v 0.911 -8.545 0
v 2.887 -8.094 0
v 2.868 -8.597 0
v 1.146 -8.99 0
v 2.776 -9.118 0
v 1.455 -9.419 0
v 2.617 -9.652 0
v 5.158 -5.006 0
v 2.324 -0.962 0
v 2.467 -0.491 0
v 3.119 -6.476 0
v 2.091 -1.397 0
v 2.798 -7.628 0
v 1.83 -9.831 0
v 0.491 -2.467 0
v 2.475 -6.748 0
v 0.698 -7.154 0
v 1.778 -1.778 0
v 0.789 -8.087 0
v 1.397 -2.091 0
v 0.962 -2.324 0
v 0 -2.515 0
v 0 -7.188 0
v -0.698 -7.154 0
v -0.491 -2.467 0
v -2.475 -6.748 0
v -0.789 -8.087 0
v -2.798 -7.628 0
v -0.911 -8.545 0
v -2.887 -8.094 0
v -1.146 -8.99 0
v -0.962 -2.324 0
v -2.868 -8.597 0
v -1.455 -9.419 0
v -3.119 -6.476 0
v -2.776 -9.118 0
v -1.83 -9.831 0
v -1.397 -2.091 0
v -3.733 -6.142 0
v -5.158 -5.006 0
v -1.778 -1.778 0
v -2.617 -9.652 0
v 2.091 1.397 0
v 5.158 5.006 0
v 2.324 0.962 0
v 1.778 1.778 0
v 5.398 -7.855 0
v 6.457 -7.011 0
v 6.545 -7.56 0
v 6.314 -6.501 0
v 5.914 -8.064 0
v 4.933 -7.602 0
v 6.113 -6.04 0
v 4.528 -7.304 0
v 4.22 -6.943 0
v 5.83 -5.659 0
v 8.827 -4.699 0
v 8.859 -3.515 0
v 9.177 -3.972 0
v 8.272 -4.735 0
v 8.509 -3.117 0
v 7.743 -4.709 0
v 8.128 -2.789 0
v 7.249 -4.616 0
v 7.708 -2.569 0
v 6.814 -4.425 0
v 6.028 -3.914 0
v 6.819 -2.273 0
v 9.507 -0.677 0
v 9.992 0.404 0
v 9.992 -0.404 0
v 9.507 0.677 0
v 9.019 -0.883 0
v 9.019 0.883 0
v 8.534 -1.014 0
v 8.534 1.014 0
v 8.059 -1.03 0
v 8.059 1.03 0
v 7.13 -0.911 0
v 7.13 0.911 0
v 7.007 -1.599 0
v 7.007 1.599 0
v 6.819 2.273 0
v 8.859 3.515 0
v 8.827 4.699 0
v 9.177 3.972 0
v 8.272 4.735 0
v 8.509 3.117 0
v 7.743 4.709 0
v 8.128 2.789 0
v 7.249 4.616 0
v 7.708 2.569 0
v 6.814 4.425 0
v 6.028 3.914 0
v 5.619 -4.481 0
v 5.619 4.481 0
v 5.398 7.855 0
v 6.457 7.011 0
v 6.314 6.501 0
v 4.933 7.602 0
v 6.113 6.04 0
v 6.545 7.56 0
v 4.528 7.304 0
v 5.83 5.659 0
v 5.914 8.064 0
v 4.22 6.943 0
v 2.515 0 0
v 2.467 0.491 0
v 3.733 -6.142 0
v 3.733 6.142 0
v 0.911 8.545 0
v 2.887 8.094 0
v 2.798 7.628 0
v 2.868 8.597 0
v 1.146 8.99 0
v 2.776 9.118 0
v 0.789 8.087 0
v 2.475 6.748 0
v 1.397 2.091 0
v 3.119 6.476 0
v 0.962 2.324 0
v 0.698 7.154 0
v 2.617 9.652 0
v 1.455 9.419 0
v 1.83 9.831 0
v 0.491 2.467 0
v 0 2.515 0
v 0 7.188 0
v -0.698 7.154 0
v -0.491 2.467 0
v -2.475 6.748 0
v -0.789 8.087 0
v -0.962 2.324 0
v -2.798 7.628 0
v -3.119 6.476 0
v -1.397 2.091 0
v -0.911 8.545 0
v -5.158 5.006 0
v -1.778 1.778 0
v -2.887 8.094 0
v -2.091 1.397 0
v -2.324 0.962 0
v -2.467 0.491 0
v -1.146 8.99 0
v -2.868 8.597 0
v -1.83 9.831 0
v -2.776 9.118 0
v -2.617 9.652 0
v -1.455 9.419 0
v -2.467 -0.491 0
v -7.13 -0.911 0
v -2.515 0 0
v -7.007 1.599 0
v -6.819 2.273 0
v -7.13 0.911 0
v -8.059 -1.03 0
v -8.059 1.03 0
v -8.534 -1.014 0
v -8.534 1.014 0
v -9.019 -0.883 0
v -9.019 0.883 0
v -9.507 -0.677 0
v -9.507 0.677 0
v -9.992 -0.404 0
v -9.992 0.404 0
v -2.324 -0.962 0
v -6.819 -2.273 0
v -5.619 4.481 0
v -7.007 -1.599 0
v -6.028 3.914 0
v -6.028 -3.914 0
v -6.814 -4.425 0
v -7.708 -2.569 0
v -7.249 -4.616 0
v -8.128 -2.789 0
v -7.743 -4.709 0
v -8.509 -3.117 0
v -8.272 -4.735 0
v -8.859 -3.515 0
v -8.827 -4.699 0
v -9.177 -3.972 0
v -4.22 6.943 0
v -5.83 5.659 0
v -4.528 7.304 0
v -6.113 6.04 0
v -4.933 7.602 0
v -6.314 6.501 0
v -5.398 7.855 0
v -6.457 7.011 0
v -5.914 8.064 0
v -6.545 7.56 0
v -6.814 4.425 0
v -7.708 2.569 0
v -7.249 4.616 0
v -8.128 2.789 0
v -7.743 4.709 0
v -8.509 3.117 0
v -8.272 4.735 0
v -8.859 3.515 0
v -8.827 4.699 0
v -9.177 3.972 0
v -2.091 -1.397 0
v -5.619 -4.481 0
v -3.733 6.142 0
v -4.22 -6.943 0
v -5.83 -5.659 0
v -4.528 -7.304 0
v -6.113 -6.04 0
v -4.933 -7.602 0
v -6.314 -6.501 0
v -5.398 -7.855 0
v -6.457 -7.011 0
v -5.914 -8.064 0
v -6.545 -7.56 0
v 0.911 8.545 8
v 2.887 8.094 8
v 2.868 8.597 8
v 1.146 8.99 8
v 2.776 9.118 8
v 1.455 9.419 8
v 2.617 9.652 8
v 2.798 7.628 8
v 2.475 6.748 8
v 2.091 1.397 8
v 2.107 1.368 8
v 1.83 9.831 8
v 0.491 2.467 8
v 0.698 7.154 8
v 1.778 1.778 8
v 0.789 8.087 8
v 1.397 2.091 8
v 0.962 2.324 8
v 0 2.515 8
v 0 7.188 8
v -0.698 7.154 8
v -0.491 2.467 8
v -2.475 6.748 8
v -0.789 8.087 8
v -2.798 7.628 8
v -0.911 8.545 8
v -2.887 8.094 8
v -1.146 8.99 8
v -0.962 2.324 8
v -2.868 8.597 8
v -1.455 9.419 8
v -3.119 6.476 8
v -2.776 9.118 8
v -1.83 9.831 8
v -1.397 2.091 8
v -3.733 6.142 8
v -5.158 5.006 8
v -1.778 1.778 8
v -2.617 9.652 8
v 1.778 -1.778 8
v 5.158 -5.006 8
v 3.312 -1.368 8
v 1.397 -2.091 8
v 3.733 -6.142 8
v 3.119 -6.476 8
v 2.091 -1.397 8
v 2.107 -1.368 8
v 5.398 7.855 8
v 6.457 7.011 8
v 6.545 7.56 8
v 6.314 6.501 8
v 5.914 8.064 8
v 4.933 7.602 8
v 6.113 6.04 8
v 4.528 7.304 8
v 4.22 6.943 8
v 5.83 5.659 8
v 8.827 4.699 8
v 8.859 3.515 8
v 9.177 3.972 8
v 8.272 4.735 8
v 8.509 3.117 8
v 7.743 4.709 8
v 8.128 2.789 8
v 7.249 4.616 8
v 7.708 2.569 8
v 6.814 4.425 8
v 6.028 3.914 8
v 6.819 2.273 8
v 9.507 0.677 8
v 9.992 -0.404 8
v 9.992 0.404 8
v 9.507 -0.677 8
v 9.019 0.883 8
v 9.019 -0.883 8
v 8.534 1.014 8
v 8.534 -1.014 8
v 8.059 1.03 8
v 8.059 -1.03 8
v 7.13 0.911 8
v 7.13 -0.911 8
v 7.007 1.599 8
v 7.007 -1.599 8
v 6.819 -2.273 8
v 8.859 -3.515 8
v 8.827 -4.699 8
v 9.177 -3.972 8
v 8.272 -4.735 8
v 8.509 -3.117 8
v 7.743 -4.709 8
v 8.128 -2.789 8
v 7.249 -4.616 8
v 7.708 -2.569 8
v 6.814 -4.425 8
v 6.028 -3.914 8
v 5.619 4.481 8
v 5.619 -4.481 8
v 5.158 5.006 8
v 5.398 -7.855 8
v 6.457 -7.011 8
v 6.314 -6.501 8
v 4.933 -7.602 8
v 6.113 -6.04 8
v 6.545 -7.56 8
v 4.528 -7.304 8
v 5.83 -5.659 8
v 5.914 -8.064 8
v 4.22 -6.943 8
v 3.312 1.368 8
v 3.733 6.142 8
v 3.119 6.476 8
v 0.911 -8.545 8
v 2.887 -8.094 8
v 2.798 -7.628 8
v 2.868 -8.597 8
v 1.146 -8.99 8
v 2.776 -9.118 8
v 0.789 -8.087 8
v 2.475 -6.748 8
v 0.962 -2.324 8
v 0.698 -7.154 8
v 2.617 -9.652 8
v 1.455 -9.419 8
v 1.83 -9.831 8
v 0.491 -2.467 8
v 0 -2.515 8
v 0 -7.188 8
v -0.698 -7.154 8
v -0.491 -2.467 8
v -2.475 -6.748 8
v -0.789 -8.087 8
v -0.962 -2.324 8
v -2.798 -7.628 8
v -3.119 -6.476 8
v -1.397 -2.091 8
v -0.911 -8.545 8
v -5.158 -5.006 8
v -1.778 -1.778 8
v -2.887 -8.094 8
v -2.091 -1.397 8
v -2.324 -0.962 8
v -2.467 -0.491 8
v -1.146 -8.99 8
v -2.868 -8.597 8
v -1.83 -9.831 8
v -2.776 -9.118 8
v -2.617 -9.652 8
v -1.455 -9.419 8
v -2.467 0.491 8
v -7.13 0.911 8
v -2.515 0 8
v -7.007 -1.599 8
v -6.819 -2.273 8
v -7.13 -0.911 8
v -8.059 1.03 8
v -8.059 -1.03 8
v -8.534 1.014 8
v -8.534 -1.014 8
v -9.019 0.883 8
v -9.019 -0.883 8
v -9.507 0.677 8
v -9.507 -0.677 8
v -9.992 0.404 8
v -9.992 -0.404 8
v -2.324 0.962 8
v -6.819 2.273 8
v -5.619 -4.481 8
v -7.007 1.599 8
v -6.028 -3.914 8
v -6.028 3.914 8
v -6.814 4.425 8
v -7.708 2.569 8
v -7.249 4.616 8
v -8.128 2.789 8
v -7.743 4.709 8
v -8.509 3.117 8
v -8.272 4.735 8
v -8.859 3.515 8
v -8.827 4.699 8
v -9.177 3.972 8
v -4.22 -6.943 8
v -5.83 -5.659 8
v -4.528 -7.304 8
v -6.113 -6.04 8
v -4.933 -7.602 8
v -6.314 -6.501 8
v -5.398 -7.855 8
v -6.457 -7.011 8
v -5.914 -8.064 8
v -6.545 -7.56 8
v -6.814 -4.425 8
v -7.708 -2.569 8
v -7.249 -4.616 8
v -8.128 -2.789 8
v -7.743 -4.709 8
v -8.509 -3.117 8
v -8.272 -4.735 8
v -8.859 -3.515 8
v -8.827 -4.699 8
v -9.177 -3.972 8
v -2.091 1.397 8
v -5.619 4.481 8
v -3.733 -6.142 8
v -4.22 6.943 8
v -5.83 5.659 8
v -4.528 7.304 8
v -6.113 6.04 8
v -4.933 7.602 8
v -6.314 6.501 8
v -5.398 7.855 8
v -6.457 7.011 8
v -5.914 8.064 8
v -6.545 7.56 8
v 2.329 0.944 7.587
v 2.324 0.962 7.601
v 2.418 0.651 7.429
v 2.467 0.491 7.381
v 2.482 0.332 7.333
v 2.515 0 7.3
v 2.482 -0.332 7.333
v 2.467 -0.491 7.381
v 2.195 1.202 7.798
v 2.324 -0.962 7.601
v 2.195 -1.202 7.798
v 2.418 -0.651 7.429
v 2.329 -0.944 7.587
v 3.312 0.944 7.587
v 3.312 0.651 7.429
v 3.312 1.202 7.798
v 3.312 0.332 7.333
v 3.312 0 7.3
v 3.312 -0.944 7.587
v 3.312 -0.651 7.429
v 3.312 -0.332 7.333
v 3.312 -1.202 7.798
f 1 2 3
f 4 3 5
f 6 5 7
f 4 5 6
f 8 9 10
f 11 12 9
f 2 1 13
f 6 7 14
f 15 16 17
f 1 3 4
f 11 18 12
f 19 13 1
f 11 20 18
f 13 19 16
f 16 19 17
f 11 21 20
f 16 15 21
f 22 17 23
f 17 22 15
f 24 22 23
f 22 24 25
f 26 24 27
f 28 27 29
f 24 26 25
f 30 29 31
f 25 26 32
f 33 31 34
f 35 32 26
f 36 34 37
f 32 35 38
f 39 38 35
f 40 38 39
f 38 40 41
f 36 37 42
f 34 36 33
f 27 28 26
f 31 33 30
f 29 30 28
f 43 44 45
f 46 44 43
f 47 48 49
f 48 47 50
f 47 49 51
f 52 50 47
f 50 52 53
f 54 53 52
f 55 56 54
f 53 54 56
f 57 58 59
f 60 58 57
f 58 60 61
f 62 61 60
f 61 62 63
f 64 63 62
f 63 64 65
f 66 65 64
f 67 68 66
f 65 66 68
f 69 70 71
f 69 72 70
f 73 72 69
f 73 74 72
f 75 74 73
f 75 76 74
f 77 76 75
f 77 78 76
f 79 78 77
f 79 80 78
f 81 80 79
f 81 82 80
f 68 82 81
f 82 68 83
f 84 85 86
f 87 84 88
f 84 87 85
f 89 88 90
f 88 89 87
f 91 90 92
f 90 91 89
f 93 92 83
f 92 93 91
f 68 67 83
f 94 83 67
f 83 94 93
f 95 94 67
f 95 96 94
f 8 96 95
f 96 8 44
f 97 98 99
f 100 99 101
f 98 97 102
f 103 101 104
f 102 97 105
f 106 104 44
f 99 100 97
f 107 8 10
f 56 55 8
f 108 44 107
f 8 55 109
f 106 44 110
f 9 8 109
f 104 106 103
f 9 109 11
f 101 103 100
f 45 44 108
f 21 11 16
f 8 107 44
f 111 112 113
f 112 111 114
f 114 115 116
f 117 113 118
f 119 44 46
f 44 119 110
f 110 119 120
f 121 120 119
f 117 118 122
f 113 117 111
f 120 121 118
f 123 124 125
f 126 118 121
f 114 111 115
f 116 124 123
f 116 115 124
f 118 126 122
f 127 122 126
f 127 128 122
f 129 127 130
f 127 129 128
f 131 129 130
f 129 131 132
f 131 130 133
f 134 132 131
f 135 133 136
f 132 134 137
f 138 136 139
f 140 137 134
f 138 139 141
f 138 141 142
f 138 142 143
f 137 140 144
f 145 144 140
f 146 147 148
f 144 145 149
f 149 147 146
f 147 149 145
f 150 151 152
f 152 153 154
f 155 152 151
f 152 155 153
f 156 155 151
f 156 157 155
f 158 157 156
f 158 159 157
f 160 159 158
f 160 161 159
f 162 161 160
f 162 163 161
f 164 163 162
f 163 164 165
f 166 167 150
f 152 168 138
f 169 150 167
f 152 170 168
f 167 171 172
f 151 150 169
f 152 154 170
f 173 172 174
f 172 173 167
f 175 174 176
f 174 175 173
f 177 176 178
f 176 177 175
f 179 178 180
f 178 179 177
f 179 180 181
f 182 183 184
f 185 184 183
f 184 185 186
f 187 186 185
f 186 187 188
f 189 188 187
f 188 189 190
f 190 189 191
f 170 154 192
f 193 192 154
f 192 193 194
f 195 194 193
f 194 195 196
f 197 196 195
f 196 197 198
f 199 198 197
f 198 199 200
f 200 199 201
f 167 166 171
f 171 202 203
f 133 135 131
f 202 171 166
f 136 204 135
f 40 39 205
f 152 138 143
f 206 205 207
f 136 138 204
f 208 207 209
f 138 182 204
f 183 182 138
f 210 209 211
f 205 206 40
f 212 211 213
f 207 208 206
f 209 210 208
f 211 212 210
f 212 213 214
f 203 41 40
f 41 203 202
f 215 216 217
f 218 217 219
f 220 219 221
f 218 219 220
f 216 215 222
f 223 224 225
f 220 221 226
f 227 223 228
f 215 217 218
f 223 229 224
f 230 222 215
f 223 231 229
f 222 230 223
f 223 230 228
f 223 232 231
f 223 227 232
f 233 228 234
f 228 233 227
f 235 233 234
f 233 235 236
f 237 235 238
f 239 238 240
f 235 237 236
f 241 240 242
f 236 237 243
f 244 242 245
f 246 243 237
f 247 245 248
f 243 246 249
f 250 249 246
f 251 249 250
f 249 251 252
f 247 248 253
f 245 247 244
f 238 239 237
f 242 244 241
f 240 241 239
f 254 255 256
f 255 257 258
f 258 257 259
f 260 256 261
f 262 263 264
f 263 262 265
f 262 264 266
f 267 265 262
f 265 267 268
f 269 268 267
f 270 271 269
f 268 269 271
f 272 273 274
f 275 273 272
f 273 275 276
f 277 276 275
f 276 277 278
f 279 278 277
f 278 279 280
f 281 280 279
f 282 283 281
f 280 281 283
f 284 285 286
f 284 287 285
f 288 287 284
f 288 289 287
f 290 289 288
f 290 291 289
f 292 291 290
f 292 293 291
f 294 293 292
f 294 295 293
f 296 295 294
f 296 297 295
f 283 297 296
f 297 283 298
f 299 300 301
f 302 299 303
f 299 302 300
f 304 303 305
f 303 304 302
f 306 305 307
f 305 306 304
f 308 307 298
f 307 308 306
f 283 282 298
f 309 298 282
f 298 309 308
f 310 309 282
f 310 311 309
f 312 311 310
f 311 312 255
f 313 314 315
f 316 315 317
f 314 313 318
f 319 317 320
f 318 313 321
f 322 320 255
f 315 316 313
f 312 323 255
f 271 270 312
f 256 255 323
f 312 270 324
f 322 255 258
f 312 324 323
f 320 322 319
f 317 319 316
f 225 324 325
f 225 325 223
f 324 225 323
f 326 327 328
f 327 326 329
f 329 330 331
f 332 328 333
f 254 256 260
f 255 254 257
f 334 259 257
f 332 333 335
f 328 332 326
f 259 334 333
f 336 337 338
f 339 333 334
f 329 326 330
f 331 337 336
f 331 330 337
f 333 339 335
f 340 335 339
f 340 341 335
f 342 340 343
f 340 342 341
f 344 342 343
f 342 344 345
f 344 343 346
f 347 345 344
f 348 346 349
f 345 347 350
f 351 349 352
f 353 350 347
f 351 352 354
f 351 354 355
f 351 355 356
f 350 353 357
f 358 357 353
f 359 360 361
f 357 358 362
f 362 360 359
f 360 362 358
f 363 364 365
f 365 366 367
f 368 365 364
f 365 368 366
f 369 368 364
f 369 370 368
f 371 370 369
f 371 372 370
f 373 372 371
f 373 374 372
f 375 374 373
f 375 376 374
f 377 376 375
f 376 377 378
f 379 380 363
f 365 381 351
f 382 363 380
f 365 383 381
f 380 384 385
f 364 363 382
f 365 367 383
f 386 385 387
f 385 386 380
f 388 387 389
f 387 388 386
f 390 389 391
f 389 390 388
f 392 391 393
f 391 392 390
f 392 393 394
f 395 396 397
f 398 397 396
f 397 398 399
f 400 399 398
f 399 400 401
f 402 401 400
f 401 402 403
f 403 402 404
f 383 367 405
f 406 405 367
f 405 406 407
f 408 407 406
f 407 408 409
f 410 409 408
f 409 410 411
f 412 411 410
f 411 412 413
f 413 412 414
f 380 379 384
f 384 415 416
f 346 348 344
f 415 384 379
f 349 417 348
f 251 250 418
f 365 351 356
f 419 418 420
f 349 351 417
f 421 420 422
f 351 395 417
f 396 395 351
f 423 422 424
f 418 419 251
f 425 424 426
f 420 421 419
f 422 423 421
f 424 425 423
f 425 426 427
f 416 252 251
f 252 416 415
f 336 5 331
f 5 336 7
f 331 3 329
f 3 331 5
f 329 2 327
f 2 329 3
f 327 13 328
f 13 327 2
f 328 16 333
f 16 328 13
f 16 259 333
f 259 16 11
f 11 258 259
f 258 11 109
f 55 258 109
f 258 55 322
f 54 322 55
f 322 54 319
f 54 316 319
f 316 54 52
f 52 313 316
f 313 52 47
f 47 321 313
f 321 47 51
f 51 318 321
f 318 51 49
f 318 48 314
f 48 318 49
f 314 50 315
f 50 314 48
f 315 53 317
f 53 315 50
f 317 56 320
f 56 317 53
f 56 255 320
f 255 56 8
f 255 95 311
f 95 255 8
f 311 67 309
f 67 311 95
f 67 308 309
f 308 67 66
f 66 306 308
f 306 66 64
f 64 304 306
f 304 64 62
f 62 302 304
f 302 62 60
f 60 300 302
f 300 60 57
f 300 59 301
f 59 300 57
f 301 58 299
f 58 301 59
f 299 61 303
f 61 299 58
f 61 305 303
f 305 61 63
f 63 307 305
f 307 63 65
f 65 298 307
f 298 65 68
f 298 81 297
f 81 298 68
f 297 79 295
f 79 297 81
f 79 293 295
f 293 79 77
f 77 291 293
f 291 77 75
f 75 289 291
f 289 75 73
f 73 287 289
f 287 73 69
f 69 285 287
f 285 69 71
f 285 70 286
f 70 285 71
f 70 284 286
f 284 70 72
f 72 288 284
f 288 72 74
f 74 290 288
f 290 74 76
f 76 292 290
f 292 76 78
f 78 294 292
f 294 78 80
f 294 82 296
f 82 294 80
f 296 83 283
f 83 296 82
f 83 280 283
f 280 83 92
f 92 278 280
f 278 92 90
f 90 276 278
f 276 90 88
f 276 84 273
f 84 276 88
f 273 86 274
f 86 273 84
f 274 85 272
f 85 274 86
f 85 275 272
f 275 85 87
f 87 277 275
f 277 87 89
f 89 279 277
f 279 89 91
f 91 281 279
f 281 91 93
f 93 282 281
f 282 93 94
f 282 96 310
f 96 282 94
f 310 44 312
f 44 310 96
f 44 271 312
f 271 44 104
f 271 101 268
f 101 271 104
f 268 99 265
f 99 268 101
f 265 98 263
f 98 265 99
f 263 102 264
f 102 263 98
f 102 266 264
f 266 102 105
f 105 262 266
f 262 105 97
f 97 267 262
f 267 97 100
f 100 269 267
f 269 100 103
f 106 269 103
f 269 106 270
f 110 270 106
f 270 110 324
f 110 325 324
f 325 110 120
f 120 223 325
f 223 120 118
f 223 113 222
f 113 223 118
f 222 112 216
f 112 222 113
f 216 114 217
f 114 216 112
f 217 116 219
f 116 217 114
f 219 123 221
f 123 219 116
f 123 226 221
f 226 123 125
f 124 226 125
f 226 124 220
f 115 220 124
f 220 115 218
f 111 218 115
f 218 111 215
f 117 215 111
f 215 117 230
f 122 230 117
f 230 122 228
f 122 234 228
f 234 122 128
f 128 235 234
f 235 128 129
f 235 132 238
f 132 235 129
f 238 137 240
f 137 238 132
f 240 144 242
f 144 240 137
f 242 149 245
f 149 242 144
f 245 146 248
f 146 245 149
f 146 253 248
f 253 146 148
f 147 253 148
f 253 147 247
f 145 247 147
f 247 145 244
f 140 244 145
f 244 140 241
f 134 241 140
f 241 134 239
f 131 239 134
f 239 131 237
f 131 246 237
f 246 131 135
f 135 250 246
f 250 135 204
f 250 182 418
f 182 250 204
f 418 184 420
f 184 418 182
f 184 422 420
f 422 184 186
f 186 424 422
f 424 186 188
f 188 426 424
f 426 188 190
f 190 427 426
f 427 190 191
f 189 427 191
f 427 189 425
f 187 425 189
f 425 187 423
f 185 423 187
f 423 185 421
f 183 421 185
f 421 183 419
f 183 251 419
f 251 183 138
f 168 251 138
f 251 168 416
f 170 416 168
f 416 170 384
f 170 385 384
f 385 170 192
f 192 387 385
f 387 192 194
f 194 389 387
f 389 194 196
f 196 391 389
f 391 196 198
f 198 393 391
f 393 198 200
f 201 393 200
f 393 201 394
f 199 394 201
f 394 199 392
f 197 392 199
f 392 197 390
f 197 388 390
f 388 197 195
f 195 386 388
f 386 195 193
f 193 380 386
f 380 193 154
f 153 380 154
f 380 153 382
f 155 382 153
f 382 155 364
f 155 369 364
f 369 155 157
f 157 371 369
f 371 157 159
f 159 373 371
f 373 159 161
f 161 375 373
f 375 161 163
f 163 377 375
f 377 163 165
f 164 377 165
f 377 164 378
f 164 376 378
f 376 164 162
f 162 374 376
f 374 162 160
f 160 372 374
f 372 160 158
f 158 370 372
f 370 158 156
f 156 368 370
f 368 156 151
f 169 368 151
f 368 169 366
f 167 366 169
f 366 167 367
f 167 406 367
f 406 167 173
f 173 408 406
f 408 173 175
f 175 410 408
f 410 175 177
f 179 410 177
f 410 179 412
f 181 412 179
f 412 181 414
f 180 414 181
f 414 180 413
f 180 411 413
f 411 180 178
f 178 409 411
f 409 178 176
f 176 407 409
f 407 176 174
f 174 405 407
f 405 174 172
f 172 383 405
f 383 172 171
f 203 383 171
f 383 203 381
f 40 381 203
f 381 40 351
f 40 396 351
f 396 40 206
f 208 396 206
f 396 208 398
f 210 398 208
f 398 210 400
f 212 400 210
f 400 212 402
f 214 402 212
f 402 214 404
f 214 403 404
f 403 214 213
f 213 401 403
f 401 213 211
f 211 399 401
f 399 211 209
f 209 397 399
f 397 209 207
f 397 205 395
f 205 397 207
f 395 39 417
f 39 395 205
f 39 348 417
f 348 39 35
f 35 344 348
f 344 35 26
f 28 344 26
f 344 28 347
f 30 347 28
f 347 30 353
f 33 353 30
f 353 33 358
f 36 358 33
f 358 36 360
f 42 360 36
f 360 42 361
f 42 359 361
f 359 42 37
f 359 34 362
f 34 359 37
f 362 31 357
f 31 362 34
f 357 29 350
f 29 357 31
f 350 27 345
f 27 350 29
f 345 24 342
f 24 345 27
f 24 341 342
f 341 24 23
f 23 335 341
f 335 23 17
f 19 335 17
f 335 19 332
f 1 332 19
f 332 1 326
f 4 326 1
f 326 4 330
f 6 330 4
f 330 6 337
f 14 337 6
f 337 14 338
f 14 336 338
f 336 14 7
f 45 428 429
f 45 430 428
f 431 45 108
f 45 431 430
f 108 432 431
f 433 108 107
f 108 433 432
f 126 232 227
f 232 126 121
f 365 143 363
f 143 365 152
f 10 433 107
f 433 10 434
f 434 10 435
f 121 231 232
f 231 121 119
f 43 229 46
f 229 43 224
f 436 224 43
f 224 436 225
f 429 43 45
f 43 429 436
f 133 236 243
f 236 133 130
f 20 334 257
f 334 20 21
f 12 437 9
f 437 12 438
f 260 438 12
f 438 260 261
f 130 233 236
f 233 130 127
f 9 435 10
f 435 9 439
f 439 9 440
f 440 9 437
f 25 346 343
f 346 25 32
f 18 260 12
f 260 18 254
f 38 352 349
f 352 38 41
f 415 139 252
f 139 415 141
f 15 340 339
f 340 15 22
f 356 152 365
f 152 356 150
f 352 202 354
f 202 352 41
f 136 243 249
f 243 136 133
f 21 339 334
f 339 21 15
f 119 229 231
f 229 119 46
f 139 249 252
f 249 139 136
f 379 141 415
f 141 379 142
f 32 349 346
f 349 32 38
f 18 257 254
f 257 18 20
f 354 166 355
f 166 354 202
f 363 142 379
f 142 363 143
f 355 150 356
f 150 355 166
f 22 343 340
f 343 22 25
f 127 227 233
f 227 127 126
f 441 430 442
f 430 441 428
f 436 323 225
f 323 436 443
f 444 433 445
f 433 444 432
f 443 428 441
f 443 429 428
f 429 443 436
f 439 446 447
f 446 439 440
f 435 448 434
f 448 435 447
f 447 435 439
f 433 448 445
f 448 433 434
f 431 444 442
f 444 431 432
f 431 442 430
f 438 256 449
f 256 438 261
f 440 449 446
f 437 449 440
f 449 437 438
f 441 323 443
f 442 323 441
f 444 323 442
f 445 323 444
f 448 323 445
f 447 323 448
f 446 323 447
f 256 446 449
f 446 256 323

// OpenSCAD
$fn = 32;

// ----------------------------------------------------------------------
// Spur gear: m=1.25 z=14, 20 mm tip diameter x 8 mm
// ----------------------------------------------------------------------

// --- parameters (mm) ---
module_m = 1.25;          // module
teeth = 14;               // number of teeth
face_w = 8;               // face width
pa = 20;                  // pressure angle, deg
bore_d = 5.03;            // shaft bore
set_d = 3.4;              // set screw tap hole
set_z = 9;                // set screw height

/* --- involute profile --- */
pitch_r = module_m * teeth / 2;
base_r = pitch_r * cos(pa);
tip_r = pitch_r + module_m;
root_r = pitch_r - 1.25 * module_m;
flank_steps = 6;

function inv_deg(a) = (tan(a) - a * PI / 180) * 180 / PI;
function flank_r(i) = root_r + (tip_r - root_r) * i / flank_steps;
function half_angle(r) = 90 / teeth + inv_deg(pa) - inv_deg(acos(min(1, base_r / r)));
function tooth_pt(k, i, side) =
    let (r = flank_r(i), a = k * 360 / teeth + side * half_angle(r))
    [r * cos(a), r * sin(a)];

module tooth_profile() {
  polygon(points = [
    for (k = [0 : teeth - 1])
      each [
        for (i = [0 : flank_steps]) tooth_pt(k, i, -1),
        for (i = [flank_steps : -1 : 0]) tooth_pt(k, i, 1),
        let (ta = (k + 0.5) * 360 / teeth)
          [root_r * cos(ta), root_r * sin(ta)]
      ]
  ]);
}

module gear_disc() {
  linear_extrude(height = face_w) tooth_profile();
}

difference() {
  gear_disc();
  translate([0, 0, -1]) cylinder(h = face_w + 3, d = bore_d);
  /* set screw, drilled radially */
  translate([-1, 0, set_z]) rotate([0, 90, 0]) cylinder(h = (root_r * 0.6), d = set_d);
}
